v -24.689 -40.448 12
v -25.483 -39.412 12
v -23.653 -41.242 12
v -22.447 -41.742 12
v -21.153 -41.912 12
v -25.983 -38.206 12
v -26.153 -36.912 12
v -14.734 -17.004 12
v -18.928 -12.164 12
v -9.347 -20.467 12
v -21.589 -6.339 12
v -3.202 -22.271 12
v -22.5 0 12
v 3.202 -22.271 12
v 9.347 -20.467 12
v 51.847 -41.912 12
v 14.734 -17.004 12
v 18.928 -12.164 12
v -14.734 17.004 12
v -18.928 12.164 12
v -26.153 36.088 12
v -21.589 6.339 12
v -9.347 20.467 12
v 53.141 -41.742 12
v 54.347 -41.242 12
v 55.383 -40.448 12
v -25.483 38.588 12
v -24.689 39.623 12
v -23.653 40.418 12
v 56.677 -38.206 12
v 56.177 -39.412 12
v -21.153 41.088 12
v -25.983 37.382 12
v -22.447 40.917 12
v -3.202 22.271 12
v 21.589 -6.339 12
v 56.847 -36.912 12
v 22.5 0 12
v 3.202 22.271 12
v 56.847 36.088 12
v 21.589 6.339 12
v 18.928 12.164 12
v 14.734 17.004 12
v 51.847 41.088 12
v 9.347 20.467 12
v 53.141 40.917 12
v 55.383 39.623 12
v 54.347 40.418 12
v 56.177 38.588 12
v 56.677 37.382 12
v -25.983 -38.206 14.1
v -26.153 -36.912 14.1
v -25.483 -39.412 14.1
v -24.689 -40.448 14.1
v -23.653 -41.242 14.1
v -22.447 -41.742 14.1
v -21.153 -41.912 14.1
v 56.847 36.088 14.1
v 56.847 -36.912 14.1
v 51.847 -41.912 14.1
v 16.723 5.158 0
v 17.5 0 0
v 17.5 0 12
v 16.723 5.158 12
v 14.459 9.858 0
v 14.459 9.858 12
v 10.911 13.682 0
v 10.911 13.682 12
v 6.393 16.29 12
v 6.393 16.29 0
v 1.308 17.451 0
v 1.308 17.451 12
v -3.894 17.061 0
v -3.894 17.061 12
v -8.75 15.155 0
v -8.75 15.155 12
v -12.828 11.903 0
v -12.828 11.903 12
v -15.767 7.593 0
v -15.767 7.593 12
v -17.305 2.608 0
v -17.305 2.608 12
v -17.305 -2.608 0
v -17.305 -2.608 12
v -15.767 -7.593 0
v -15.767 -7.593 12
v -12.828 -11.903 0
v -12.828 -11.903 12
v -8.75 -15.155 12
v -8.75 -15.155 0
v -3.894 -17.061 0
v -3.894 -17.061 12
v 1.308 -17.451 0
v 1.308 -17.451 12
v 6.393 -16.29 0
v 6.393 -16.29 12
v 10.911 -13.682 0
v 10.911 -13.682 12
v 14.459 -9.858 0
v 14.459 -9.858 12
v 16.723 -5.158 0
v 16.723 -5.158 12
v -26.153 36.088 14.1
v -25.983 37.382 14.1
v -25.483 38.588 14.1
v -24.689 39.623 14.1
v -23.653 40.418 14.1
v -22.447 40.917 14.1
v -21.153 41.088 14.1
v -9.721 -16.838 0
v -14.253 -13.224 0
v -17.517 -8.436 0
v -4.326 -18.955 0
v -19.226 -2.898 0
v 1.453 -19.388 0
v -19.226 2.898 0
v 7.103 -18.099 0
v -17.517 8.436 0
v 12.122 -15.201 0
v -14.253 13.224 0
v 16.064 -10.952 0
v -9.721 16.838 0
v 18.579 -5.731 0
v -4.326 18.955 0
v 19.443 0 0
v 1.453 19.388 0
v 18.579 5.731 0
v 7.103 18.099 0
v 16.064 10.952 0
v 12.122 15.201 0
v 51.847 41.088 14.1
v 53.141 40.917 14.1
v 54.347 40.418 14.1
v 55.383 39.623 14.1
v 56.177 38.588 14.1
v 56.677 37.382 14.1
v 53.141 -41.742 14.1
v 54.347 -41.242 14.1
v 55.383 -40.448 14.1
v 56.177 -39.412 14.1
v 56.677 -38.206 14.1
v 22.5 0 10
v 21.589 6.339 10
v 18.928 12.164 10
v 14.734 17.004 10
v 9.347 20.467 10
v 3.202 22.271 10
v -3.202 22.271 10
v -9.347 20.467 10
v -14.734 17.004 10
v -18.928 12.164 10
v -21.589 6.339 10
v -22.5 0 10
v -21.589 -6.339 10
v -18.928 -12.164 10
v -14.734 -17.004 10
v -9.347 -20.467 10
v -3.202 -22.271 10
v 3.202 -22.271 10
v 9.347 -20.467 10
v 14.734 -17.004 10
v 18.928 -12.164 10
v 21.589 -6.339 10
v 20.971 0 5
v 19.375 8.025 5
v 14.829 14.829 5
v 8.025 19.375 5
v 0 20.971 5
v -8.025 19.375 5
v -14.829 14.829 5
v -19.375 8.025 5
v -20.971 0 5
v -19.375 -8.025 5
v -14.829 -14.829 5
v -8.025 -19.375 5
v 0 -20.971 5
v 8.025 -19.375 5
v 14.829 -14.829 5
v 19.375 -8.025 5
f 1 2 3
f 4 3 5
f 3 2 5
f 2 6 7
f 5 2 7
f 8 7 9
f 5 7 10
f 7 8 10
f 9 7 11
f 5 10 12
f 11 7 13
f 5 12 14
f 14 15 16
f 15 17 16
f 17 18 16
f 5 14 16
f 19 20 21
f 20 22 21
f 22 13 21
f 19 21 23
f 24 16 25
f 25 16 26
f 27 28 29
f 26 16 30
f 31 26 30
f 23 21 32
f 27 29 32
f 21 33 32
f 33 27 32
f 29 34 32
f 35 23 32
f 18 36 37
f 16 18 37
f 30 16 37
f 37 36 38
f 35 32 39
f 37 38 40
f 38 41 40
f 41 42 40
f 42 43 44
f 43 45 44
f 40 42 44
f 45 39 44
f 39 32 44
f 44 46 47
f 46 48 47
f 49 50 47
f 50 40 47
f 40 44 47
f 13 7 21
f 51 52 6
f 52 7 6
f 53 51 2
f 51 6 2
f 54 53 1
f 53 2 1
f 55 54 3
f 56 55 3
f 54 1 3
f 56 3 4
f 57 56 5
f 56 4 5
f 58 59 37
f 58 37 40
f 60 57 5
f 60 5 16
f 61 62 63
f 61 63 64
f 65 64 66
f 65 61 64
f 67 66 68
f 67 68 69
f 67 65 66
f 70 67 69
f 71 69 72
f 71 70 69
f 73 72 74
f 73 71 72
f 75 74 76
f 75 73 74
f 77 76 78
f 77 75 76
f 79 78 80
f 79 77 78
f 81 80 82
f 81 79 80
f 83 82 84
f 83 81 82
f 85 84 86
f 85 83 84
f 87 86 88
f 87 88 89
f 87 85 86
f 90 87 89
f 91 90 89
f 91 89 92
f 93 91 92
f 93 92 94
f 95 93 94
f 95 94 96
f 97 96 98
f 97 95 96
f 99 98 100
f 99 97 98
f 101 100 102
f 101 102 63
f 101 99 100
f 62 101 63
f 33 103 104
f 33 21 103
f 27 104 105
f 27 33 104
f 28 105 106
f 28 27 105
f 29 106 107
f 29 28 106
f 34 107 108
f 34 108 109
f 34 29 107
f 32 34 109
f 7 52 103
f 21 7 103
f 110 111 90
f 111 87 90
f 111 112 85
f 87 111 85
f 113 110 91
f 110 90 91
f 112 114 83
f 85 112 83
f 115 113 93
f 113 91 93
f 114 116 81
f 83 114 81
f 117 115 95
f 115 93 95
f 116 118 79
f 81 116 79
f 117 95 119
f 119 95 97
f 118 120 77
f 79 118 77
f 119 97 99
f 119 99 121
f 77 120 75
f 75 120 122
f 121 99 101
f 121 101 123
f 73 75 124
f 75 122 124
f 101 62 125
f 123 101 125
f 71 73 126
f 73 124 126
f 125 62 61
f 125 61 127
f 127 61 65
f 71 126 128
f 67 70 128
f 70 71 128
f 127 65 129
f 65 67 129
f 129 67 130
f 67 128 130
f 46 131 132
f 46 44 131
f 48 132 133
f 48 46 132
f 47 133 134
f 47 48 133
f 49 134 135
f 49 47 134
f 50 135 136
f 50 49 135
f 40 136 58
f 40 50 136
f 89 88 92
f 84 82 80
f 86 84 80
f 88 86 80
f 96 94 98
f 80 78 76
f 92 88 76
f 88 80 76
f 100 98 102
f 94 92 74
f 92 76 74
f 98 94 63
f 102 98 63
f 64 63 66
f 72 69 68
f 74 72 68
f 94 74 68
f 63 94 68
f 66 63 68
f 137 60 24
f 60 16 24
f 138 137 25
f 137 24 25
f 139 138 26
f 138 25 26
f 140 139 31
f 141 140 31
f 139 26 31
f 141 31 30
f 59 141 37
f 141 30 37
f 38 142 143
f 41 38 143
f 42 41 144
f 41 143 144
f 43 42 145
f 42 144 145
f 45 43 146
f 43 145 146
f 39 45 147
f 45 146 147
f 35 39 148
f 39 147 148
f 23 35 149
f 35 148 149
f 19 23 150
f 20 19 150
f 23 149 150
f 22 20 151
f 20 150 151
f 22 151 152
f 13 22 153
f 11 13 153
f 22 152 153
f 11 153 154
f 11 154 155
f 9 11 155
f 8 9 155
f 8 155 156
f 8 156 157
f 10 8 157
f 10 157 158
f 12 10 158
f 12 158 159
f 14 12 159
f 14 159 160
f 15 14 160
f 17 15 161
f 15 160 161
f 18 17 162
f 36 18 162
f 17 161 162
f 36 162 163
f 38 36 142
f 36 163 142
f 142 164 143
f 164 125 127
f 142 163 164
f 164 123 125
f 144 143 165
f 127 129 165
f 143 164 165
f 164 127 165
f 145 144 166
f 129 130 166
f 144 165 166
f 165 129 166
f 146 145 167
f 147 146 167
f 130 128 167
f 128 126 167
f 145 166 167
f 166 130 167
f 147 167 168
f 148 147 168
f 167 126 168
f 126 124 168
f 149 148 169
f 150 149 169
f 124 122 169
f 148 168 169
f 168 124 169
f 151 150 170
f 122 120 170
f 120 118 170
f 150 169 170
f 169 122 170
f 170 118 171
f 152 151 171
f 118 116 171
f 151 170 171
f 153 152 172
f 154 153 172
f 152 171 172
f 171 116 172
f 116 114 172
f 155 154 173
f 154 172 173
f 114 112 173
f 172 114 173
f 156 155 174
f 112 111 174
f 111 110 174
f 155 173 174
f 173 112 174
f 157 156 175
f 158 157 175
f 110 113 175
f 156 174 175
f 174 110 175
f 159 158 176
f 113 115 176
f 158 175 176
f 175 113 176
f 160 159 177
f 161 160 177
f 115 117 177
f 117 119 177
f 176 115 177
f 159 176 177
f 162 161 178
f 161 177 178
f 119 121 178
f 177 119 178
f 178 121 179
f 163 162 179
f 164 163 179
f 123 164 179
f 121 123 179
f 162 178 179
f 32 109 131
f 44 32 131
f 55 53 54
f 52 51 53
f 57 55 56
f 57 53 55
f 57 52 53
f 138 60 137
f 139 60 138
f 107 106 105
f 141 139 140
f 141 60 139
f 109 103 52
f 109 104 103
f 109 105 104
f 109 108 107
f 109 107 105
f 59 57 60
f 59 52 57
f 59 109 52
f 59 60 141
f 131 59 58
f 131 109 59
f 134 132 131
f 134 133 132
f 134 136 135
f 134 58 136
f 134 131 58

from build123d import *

# Parameters (mm, degrees)
F0_R     = 22.5
F0_R_2   = 17.5
F1_DEPTH = 12
F2_SIZE2 = 3.0573068146
F2_SIZE  = 10
F4_W     = 83
F4_H     = 83
F5_DEPTH = 2.1
F6_R     = 5


with BuildPart() as f1:
    # F0 (on Top) → F1 (new body)
    with BuildSketch(Plane.XY):
        Circle(F0_R)
        Circle(F0_R_2, mode=Mode.SUBTRACT)
    extrude(amount=F1_DEPTH)

    # F2
    f2_edges = [f1.edges().sort_by_distance(p)[0] for p in [
        (-22.5, 0, 0),
    ]]
    f2_side = f1.faces().sort_by_distance((-22.5, 0, 6))[0]
    chamfer(f2_edges, length=F2_SIZE, length2=F2_SIZE2, reference=f2_side)

    # F4 (on offset) → F5 (join)
    with BuildSketch(Plane.XY.offset(14.1)):
        with Locations((15.3470120901, -0.4123098433)):
            Rectangle(F4_W, F4_H)
    extrude(amount=-F5_DEPTH)

    # F6
    f6_edges = [f1.edges().sort_by_distance(p)[0] for p in [
        (-26.152988, -41.91231, 13.05),
        (56.847012, -41.91231, 13.05),
        (-26.152988, 41.08769, 13.05),
        (56.847012, 41.08769, 13.05),
    ]]
    fillet(f6_edges, radius=F6_R)


solid = f1.part
